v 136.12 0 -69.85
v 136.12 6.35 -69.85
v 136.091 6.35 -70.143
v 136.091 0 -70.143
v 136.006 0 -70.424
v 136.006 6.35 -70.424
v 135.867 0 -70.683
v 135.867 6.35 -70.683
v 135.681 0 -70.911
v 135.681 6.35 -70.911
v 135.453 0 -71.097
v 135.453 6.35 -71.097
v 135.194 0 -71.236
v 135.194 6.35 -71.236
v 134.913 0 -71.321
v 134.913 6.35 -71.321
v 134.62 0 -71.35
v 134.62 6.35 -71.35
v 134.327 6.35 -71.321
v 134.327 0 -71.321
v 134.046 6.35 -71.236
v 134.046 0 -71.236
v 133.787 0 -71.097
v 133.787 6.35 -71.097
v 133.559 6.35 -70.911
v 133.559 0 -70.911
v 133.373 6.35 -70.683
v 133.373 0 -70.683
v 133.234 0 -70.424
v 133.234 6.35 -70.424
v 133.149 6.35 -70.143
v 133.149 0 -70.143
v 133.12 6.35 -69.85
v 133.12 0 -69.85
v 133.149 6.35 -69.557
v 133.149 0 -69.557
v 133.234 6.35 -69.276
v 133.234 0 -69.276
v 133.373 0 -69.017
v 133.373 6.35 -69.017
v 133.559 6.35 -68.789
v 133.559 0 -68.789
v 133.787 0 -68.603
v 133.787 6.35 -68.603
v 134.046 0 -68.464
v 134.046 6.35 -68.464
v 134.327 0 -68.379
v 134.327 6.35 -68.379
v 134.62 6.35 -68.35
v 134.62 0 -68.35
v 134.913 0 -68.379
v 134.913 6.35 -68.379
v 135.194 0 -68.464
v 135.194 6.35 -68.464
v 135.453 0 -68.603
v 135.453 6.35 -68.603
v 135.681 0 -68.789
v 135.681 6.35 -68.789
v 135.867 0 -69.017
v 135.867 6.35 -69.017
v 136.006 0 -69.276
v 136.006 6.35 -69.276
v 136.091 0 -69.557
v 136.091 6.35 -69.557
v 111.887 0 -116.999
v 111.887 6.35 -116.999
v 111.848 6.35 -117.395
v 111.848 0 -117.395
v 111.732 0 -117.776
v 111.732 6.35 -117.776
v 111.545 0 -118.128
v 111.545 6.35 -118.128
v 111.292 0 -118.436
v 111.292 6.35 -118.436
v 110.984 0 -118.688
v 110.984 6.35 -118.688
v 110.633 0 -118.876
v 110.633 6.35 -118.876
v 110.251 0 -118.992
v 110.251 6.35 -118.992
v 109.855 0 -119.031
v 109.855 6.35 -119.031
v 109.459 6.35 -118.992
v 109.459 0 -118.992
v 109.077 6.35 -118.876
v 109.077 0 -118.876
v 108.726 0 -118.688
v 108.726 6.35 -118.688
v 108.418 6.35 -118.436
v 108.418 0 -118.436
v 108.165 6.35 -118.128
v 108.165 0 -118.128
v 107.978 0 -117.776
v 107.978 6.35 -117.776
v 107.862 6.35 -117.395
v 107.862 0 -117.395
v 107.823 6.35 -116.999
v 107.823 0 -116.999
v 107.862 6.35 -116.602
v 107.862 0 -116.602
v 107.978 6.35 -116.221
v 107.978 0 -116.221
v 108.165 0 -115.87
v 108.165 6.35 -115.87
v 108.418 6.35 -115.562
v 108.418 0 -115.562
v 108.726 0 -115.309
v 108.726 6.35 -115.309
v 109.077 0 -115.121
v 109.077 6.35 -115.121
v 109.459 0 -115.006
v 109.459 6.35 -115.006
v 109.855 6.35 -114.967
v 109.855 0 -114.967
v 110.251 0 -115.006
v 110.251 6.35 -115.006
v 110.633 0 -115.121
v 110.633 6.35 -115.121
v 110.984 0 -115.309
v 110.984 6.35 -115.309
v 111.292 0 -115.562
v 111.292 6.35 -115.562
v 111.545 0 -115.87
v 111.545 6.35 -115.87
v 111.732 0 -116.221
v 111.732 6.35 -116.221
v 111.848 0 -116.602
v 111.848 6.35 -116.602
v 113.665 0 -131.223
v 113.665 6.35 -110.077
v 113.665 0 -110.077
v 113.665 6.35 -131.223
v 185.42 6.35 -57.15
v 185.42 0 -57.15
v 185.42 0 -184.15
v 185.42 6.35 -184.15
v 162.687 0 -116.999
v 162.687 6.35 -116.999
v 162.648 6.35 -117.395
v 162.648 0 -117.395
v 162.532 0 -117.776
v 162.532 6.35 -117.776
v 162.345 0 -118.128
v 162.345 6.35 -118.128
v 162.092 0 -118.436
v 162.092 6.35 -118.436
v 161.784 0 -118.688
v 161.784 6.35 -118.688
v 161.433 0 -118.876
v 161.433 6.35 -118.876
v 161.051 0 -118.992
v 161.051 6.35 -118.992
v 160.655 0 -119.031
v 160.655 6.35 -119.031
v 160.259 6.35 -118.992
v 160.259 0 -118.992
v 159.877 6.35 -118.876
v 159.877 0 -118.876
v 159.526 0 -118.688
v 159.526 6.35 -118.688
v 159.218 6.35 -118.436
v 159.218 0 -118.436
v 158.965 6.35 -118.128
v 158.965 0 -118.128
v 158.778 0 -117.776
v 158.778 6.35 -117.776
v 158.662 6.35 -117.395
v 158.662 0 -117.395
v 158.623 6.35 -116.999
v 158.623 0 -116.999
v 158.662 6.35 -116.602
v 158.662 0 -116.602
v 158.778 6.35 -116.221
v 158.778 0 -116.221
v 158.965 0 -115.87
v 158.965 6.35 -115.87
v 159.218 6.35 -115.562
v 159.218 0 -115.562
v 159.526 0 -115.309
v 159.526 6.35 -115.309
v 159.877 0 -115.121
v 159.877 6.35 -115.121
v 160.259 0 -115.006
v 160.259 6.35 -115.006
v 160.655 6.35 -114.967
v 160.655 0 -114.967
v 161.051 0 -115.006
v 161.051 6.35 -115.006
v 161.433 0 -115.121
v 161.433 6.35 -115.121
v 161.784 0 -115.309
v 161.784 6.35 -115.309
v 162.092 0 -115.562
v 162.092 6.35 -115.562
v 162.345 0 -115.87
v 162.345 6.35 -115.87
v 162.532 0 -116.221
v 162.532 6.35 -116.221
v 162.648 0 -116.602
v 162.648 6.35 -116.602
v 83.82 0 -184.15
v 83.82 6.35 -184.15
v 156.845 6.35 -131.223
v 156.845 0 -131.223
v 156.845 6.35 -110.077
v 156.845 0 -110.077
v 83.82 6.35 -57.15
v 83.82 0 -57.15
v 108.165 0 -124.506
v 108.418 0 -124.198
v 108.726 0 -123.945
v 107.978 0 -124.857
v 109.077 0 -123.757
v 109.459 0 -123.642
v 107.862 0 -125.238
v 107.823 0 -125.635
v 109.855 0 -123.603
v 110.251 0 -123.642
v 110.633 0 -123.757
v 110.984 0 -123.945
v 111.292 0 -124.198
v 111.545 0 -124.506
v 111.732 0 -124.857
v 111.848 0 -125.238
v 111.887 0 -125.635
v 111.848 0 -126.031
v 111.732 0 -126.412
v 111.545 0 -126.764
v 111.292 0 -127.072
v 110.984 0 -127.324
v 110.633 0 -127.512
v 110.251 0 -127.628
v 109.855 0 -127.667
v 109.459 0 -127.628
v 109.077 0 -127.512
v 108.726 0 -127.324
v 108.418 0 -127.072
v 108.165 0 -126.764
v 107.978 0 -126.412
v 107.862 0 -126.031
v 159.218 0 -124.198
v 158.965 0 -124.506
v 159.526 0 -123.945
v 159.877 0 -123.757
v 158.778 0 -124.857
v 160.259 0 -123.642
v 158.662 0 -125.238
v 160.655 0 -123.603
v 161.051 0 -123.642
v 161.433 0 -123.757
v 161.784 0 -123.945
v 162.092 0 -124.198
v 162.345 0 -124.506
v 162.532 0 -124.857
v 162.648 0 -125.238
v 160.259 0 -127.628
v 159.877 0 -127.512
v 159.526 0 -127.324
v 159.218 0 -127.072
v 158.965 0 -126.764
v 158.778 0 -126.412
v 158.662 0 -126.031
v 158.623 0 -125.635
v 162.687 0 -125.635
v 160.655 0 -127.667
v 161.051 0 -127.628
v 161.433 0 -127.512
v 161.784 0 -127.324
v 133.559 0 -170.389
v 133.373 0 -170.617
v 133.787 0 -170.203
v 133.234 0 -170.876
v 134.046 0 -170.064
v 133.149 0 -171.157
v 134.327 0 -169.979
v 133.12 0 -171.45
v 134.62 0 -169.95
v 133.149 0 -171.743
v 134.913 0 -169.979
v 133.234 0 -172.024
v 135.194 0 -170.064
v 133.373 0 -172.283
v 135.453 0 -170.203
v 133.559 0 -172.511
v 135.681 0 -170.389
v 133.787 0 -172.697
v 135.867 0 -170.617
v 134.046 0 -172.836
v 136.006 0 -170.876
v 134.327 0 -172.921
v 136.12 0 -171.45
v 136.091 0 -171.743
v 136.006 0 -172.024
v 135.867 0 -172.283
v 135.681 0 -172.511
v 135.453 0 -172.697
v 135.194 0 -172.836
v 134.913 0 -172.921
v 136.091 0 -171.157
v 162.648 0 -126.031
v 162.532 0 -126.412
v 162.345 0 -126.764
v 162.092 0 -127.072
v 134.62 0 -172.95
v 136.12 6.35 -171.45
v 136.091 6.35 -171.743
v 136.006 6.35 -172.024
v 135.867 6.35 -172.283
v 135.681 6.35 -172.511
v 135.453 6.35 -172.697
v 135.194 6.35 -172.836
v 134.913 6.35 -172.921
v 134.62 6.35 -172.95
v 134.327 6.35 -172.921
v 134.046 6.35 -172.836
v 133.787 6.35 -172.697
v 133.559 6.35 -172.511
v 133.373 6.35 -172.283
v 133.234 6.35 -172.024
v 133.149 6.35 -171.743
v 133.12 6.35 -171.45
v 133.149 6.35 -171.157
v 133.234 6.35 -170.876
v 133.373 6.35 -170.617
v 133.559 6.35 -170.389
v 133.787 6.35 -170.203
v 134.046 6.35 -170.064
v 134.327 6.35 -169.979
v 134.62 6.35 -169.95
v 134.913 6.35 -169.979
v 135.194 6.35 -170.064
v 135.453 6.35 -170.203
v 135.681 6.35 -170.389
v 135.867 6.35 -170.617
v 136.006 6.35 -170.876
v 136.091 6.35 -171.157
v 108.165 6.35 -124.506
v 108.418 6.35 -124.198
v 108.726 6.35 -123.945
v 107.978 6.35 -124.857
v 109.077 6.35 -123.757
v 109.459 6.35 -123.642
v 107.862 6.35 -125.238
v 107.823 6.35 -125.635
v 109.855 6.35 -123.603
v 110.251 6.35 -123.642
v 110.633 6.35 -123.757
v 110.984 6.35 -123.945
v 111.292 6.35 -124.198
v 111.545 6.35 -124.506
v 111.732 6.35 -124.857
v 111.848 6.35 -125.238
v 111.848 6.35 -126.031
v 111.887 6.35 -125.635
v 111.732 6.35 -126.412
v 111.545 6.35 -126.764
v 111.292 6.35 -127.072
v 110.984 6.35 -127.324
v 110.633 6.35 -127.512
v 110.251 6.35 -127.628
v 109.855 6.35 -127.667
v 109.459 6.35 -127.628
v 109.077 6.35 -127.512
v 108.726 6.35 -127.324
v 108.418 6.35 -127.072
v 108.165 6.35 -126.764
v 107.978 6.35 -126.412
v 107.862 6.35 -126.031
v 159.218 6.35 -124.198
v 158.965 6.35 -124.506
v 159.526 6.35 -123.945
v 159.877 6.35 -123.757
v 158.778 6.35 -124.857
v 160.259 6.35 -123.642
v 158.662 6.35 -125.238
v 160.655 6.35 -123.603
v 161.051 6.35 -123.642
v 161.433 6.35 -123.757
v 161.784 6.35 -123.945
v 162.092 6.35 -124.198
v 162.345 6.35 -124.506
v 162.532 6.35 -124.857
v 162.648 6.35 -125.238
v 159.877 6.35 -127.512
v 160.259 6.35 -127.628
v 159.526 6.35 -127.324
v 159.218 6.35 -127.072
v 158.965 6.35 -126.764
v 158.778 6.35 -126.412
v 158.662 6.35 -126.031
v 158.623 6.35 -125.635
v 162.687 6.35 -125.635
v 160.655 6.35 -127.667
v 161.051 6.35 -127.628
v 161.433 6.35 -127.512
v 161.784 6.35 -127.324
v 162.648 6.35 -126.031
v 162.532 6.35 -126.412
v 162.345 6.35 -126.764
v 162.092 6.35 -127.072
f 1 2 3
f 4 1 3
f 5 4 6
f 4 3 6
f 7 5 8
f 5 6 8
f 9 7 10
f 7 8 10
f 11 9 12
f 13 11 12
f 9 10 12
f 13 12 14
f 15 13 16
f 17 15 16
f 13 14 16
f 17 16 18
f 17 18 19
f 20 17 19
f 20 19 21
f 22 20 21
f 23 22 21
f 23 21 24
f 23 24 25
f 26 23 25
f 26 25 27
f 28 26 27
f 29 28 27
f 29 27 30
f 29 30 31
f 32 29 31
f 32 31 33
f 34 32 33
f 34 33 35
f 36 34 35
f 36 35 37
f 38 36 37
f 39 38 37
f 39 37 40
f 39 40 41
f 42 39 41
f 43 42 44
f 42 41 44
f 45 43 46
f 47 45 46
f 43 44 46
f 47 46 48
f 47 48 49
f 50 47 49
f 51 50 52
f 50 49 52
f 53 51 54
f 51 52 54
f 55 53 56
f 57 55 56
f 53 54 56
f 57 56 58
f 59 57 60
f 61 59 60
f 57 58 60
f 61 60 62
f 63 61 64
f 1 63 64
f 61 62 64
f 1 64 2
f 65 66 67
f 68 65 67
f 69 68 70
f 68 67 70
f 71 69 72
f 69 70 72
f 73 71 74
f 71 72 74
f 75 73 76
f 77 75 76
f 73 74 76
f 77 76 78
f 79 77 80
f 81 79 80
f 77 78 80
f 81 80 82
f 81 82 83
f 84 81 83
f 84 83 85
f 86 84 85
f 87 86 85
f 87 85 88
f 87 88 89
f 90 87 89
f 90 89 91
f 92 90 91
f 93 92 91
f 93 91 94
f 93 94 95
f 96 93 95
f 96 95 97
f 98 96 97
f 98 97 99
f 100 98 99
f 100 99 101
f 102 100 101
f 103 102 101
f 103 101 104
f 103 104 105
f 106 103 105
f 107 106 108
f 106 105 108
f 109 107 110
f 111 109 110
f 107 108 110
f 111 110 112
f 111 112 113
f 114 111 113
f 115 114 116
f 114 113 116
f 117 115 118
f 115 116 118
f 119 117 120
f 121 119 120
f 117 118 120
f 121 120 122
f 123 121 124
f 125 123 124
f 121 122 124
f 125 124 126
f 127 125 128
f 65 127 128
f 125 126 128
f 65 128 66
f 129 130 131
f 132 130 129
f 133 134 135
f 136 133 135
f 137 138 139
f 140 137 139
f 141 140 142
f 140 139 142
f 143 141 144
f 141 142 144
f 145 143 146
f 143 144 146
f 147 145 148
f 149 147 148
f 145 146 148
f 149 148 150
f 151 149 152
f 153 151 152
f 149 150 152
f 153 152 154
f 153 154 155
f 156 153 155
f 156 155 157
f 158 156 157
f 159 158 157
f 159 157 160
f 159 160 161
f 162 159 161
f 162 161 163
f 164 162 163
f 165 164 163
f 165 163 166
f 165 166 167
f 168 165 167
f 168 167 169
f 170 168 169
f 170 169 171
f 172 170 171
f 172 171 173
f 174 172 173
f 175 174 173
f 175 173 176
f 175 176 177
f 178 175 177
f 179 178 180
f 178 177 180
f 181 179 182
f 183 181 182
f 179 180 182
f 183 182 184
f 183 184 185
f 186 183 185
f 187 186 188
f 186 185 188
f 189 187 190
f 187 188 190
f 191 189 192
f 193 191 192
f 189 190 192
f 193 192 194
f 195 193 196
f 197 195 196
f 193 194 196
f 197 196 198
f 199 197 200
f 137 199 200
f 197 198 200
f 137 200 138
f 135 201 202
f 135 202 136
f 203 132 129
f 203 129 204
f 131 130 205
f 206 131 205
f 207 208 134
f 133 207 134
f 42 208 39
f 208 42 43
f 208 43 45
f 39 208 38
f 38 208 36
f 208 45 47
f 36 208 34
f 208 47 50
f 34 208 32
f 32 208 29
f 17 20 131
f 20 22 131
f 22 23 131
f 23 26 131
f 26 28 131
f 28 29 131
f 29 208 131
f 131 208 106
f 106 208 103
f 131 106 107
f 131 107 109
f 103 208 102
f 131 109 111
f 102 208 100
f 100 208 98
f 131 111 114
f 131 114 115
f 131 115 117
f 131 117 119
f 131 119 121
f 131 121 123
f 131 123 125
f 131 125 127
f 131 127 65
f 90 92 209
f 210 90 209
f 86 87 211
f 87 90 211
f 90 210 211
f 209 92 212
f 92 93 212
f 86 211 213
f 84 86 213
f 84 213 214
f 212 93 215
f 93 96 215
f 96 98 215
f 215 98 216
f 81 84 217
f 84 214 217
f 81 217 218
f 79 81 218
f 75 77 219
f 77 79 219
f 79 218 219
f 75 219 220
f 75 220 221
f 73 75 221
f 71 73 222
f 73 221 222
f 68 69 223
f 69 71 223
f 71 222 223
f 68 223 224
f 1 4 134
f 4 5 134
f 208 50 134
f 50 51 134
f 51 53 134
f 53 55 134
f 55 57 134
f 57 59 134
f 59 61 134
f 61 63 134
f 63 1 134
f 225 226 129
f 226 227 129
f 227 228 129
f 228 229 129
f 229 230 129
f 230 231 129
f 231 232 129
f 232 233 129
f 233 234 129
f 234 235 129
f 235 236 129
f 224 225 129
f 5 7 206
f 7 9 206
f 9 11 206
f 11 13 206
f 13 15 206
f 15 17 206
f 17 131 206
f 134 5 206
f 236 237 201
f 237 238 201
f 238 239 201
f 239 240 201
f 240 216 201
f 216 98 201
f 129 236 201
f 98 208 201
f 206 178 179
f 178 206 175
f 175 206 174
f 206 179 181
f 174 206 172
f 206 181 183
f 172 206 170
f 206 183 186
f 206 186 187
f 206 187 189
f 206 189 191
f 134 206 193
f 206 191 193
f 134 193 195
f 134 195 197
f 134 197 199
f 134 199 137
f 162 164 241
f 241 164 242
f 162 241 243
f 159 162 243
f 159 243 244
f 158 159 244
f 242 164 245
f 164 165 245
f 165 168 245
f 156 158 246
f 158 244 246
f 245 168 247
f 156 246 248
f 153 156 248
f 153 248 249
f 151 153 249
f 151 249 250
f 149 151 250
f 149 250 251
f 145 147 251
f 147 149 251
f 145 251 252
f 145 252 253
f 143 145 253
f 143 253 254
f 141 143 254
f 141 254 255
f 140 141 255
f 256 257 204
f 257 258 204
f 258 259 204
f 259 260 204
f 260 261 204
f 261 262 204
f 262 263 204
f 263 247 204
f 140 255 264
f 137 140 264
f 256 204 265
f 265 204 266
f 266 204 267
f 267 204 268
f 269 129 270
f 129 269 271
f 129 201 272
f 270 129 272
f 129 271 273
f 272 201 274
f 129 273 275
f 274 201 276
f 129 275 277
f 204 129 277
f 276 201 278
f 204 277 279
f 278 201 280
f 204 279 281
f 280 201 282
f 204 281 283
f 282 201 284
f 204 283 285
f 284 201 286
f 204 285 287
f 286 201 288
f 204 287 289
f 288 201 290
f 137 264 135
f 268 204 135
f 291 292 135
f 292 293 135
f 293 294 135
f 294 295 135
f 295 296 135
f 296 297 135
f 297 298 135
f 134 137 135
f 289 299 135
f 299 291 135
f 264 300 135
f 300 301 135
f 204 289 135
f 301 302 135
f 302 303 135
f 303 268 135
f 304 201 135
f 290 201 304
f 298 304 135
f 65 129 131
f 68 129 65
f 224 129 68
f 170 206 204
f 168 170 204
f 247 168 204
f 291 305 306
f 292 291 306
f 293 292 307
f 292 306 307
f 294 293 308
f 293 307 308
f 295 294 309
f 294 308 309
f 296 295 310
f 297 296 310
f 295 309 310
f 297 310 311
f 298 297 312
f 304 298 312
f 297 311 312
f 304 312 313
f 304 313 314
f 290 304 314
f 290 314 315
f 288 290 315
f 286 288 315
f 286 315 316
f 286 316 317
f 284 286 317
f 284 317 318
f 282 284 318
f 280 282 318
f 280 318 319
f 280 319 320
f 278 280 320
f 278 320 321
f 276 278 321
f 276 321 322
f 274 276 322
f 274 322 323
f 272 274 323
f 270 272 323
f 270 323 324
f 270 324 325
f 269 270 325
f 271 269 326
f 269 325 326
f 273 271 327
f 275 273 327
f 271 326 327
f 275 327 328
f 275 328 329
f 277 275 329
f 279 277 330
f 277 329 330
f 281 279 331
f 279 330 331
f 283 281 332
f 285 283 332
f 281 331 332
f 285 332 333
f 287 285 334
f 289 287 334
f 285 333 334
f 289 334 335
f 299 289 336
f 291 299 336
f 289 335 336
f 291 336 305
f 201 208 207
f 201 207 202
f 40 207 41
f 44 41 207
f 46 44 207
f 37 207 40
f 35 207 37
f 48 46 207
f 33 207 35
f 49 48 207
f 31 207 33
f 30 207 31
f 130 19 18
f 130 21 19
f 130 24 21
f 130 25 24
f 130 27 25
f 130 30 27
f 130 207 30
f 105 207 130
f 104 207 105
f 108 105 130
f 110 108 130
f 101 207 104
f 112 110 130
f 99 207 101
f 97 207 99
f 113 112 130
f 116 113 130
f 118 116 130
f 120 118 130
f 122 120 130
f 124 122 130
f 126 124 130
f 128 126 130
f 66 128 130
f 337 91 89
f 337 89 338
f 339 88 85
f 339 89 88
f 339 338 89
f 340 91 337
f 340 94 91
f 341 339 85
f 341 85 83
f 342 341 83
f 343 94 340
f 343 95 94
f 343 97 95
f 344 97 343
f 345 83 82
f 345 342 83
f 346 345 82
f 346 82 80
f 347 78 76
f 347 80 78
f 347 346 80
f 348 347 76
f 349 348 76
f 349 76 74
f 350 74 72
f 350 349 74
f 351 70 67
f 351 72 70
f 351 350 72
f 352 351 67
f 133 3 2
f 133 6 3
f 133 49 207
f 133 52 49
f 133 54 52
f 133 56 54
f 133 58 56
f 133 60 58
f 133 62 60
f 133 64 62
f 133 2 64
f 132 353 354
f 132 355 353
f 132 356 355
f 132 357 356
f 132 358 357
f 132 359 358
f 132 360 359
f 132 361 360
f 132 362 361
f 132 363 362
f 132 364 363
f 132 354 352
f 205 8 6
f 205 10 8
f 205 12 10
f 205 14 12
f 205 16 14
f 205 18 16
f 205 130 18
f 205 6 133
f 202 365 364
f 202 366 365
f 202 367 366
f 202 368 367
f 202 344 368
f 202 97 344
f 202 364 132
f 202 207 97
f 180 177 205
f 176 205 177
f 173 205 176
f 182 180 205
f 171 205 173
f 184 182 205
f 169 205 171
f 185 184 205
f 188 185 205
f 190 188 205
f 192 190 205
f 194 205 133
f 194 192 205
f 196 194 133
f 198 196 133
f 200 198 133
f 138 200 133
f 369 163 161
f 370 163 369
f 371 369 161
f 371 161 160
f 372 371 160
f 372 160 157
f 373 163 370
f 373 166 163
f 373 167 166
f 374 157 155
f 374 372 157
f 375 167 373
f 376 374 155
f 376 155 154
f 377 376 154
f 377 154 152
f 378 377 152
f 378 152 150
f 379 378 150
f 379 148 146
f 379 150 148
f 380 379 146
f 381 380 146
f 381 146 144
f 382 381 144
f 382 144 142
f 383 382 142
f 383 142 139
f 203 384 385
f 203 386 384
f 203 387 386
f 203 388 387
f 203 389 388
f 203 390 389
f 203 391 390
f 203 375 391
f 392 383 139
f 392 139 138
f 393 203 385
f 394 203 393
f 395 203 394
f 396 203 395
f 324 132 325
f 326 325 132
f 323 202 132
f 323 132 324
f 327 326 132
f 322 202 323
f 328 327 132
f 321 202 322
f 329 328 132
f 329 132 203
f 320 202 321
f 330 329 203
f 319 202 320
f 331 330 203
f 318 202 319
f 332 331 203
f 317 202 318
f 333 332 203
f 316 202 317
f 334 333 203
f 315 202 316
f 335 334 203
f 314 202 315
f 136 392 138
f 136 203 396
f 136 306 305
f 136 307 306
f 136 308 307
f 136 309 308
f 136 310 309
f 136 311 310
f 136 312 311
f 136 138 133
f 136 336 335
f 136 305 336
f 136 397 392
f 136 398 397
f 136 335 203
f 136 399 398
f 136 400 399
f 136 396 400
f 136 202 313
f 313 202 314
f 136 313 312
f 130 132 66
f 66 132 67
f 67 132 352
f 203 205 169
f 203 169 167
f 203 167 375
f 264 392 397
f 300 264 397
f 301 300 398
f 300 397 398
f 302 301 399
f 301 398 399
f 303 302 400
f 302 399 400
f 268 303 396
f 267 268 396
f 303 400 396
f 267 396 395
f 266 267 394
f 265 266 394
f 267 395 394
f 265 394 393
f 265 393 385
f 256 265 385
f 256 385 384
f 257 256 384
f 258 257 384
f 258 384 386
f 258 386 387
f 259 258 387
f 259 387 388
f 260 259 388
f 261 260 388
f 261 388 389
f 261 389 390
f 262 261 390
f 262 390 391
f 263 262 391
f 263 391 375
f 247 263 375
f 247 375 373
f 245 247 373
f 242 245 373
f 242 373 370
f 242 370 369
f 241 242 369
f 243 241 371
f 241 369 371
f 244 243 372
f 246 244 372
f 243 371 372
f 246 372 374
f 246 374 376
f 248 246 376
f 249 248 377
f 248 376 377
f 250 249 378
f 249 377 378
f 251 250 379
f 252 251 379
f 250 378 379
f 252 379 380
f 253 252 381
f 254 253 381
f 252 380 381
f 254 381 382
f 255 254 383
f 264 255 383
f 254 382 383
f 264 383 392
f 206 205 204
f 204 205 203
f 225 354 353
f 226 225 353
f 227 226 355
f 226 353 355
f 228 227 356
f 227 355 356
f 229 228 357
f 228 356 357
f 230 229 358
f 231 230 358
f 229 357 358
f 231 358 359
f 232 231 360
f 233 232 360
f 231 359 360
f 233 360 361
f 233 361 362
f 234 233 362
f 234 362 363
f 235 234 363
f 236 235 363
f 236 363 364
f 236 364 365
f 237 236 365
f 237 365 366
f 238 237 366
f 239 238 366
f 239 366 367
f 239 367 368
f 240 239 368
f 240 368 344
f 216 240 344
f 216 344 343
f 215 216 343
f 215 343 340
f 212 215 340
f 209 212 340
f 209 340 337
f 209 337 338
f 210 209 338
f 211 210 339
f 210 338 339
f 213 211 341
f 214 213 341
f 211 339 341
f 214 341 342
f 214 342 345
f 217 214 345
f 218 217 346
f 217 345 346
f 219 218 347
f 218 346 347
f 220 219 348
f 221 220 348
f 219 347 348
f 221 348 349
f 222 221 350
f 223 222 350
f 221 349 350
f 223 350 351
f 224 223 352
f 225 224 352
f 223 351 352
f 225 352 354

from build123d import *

# Parameters (mm, degrees)
SKETCH1_W           = 101.6
SKETCH1_H           = 127
BOSS_EXTRUDE1_DEPTH = 6.35
SKETCH2_R           = 2.032
SKETCH2_W           = 43.18
SKETCH2_H           = 21.1455
CUT_EXTRUDE1_DEPTH  = 7.35
SKETCH7_R           = 1.5
CUT_EXTRUDE2_DEPTH  = 7.35


with BuildPart() as part:
    # Sketch1 → Boss-Extrude1 (new body)
    with BuildSketch(Plane(origin=(0, 0, 0), x_dir=(1, 0, 0), z_dir=(0, 1, 0))):
        with Locations((134.62, 120.65)):
            Rectangle(SKETCH1_W, SKETCH1_H)
    extrude(amount=BOSS_EXTRUDE1_DEPTH)

    # Sketch2 → Cut-Extrude1 (cut, through all)
    with BuildSketch(Plane(origin=(0, 6.35, 0), x_dir=(1, 0, 0), z_dir=(0, 1, 0))):
        with Locations((109.855, 116.99875)):
            Circle(SKETCH2_R)
        with Locations((109.855, 125.63475)):
            Circle(SKETCH2_R)
        with Locations((160.655, 125.63475)):
            Circle(SKETCH2_R)
        with Locations((160.655, 116.99875)):
            Circle(SKETCH2_R)
        with Locations((135.255, 120.65)):
            Rectangle(SKETCH2_W, SKETCH2_H)
    extrude(amount=-CUT_EXTRUDE1_DEPTH, mode=Mode.SUBTRACT)

    # Sketch7 → Cut-Extrude2 (cut, through all)
    with BuildSketch(Plane(origin=(0, 6.35, 0), x_dir=(1, 0, 0), z_dir=(0, 1, 0))):
        with Locations((134.62, 171.45)):
            Circle(SKETCH7_R)
        with Locations((134.62, 69.85)):
            Circle(SKETCH7_R)
    extrude(amount=-CUT_EXTRUDE2_DEPTH, mode=Mode.SUBTRACT)


solid = part.part
